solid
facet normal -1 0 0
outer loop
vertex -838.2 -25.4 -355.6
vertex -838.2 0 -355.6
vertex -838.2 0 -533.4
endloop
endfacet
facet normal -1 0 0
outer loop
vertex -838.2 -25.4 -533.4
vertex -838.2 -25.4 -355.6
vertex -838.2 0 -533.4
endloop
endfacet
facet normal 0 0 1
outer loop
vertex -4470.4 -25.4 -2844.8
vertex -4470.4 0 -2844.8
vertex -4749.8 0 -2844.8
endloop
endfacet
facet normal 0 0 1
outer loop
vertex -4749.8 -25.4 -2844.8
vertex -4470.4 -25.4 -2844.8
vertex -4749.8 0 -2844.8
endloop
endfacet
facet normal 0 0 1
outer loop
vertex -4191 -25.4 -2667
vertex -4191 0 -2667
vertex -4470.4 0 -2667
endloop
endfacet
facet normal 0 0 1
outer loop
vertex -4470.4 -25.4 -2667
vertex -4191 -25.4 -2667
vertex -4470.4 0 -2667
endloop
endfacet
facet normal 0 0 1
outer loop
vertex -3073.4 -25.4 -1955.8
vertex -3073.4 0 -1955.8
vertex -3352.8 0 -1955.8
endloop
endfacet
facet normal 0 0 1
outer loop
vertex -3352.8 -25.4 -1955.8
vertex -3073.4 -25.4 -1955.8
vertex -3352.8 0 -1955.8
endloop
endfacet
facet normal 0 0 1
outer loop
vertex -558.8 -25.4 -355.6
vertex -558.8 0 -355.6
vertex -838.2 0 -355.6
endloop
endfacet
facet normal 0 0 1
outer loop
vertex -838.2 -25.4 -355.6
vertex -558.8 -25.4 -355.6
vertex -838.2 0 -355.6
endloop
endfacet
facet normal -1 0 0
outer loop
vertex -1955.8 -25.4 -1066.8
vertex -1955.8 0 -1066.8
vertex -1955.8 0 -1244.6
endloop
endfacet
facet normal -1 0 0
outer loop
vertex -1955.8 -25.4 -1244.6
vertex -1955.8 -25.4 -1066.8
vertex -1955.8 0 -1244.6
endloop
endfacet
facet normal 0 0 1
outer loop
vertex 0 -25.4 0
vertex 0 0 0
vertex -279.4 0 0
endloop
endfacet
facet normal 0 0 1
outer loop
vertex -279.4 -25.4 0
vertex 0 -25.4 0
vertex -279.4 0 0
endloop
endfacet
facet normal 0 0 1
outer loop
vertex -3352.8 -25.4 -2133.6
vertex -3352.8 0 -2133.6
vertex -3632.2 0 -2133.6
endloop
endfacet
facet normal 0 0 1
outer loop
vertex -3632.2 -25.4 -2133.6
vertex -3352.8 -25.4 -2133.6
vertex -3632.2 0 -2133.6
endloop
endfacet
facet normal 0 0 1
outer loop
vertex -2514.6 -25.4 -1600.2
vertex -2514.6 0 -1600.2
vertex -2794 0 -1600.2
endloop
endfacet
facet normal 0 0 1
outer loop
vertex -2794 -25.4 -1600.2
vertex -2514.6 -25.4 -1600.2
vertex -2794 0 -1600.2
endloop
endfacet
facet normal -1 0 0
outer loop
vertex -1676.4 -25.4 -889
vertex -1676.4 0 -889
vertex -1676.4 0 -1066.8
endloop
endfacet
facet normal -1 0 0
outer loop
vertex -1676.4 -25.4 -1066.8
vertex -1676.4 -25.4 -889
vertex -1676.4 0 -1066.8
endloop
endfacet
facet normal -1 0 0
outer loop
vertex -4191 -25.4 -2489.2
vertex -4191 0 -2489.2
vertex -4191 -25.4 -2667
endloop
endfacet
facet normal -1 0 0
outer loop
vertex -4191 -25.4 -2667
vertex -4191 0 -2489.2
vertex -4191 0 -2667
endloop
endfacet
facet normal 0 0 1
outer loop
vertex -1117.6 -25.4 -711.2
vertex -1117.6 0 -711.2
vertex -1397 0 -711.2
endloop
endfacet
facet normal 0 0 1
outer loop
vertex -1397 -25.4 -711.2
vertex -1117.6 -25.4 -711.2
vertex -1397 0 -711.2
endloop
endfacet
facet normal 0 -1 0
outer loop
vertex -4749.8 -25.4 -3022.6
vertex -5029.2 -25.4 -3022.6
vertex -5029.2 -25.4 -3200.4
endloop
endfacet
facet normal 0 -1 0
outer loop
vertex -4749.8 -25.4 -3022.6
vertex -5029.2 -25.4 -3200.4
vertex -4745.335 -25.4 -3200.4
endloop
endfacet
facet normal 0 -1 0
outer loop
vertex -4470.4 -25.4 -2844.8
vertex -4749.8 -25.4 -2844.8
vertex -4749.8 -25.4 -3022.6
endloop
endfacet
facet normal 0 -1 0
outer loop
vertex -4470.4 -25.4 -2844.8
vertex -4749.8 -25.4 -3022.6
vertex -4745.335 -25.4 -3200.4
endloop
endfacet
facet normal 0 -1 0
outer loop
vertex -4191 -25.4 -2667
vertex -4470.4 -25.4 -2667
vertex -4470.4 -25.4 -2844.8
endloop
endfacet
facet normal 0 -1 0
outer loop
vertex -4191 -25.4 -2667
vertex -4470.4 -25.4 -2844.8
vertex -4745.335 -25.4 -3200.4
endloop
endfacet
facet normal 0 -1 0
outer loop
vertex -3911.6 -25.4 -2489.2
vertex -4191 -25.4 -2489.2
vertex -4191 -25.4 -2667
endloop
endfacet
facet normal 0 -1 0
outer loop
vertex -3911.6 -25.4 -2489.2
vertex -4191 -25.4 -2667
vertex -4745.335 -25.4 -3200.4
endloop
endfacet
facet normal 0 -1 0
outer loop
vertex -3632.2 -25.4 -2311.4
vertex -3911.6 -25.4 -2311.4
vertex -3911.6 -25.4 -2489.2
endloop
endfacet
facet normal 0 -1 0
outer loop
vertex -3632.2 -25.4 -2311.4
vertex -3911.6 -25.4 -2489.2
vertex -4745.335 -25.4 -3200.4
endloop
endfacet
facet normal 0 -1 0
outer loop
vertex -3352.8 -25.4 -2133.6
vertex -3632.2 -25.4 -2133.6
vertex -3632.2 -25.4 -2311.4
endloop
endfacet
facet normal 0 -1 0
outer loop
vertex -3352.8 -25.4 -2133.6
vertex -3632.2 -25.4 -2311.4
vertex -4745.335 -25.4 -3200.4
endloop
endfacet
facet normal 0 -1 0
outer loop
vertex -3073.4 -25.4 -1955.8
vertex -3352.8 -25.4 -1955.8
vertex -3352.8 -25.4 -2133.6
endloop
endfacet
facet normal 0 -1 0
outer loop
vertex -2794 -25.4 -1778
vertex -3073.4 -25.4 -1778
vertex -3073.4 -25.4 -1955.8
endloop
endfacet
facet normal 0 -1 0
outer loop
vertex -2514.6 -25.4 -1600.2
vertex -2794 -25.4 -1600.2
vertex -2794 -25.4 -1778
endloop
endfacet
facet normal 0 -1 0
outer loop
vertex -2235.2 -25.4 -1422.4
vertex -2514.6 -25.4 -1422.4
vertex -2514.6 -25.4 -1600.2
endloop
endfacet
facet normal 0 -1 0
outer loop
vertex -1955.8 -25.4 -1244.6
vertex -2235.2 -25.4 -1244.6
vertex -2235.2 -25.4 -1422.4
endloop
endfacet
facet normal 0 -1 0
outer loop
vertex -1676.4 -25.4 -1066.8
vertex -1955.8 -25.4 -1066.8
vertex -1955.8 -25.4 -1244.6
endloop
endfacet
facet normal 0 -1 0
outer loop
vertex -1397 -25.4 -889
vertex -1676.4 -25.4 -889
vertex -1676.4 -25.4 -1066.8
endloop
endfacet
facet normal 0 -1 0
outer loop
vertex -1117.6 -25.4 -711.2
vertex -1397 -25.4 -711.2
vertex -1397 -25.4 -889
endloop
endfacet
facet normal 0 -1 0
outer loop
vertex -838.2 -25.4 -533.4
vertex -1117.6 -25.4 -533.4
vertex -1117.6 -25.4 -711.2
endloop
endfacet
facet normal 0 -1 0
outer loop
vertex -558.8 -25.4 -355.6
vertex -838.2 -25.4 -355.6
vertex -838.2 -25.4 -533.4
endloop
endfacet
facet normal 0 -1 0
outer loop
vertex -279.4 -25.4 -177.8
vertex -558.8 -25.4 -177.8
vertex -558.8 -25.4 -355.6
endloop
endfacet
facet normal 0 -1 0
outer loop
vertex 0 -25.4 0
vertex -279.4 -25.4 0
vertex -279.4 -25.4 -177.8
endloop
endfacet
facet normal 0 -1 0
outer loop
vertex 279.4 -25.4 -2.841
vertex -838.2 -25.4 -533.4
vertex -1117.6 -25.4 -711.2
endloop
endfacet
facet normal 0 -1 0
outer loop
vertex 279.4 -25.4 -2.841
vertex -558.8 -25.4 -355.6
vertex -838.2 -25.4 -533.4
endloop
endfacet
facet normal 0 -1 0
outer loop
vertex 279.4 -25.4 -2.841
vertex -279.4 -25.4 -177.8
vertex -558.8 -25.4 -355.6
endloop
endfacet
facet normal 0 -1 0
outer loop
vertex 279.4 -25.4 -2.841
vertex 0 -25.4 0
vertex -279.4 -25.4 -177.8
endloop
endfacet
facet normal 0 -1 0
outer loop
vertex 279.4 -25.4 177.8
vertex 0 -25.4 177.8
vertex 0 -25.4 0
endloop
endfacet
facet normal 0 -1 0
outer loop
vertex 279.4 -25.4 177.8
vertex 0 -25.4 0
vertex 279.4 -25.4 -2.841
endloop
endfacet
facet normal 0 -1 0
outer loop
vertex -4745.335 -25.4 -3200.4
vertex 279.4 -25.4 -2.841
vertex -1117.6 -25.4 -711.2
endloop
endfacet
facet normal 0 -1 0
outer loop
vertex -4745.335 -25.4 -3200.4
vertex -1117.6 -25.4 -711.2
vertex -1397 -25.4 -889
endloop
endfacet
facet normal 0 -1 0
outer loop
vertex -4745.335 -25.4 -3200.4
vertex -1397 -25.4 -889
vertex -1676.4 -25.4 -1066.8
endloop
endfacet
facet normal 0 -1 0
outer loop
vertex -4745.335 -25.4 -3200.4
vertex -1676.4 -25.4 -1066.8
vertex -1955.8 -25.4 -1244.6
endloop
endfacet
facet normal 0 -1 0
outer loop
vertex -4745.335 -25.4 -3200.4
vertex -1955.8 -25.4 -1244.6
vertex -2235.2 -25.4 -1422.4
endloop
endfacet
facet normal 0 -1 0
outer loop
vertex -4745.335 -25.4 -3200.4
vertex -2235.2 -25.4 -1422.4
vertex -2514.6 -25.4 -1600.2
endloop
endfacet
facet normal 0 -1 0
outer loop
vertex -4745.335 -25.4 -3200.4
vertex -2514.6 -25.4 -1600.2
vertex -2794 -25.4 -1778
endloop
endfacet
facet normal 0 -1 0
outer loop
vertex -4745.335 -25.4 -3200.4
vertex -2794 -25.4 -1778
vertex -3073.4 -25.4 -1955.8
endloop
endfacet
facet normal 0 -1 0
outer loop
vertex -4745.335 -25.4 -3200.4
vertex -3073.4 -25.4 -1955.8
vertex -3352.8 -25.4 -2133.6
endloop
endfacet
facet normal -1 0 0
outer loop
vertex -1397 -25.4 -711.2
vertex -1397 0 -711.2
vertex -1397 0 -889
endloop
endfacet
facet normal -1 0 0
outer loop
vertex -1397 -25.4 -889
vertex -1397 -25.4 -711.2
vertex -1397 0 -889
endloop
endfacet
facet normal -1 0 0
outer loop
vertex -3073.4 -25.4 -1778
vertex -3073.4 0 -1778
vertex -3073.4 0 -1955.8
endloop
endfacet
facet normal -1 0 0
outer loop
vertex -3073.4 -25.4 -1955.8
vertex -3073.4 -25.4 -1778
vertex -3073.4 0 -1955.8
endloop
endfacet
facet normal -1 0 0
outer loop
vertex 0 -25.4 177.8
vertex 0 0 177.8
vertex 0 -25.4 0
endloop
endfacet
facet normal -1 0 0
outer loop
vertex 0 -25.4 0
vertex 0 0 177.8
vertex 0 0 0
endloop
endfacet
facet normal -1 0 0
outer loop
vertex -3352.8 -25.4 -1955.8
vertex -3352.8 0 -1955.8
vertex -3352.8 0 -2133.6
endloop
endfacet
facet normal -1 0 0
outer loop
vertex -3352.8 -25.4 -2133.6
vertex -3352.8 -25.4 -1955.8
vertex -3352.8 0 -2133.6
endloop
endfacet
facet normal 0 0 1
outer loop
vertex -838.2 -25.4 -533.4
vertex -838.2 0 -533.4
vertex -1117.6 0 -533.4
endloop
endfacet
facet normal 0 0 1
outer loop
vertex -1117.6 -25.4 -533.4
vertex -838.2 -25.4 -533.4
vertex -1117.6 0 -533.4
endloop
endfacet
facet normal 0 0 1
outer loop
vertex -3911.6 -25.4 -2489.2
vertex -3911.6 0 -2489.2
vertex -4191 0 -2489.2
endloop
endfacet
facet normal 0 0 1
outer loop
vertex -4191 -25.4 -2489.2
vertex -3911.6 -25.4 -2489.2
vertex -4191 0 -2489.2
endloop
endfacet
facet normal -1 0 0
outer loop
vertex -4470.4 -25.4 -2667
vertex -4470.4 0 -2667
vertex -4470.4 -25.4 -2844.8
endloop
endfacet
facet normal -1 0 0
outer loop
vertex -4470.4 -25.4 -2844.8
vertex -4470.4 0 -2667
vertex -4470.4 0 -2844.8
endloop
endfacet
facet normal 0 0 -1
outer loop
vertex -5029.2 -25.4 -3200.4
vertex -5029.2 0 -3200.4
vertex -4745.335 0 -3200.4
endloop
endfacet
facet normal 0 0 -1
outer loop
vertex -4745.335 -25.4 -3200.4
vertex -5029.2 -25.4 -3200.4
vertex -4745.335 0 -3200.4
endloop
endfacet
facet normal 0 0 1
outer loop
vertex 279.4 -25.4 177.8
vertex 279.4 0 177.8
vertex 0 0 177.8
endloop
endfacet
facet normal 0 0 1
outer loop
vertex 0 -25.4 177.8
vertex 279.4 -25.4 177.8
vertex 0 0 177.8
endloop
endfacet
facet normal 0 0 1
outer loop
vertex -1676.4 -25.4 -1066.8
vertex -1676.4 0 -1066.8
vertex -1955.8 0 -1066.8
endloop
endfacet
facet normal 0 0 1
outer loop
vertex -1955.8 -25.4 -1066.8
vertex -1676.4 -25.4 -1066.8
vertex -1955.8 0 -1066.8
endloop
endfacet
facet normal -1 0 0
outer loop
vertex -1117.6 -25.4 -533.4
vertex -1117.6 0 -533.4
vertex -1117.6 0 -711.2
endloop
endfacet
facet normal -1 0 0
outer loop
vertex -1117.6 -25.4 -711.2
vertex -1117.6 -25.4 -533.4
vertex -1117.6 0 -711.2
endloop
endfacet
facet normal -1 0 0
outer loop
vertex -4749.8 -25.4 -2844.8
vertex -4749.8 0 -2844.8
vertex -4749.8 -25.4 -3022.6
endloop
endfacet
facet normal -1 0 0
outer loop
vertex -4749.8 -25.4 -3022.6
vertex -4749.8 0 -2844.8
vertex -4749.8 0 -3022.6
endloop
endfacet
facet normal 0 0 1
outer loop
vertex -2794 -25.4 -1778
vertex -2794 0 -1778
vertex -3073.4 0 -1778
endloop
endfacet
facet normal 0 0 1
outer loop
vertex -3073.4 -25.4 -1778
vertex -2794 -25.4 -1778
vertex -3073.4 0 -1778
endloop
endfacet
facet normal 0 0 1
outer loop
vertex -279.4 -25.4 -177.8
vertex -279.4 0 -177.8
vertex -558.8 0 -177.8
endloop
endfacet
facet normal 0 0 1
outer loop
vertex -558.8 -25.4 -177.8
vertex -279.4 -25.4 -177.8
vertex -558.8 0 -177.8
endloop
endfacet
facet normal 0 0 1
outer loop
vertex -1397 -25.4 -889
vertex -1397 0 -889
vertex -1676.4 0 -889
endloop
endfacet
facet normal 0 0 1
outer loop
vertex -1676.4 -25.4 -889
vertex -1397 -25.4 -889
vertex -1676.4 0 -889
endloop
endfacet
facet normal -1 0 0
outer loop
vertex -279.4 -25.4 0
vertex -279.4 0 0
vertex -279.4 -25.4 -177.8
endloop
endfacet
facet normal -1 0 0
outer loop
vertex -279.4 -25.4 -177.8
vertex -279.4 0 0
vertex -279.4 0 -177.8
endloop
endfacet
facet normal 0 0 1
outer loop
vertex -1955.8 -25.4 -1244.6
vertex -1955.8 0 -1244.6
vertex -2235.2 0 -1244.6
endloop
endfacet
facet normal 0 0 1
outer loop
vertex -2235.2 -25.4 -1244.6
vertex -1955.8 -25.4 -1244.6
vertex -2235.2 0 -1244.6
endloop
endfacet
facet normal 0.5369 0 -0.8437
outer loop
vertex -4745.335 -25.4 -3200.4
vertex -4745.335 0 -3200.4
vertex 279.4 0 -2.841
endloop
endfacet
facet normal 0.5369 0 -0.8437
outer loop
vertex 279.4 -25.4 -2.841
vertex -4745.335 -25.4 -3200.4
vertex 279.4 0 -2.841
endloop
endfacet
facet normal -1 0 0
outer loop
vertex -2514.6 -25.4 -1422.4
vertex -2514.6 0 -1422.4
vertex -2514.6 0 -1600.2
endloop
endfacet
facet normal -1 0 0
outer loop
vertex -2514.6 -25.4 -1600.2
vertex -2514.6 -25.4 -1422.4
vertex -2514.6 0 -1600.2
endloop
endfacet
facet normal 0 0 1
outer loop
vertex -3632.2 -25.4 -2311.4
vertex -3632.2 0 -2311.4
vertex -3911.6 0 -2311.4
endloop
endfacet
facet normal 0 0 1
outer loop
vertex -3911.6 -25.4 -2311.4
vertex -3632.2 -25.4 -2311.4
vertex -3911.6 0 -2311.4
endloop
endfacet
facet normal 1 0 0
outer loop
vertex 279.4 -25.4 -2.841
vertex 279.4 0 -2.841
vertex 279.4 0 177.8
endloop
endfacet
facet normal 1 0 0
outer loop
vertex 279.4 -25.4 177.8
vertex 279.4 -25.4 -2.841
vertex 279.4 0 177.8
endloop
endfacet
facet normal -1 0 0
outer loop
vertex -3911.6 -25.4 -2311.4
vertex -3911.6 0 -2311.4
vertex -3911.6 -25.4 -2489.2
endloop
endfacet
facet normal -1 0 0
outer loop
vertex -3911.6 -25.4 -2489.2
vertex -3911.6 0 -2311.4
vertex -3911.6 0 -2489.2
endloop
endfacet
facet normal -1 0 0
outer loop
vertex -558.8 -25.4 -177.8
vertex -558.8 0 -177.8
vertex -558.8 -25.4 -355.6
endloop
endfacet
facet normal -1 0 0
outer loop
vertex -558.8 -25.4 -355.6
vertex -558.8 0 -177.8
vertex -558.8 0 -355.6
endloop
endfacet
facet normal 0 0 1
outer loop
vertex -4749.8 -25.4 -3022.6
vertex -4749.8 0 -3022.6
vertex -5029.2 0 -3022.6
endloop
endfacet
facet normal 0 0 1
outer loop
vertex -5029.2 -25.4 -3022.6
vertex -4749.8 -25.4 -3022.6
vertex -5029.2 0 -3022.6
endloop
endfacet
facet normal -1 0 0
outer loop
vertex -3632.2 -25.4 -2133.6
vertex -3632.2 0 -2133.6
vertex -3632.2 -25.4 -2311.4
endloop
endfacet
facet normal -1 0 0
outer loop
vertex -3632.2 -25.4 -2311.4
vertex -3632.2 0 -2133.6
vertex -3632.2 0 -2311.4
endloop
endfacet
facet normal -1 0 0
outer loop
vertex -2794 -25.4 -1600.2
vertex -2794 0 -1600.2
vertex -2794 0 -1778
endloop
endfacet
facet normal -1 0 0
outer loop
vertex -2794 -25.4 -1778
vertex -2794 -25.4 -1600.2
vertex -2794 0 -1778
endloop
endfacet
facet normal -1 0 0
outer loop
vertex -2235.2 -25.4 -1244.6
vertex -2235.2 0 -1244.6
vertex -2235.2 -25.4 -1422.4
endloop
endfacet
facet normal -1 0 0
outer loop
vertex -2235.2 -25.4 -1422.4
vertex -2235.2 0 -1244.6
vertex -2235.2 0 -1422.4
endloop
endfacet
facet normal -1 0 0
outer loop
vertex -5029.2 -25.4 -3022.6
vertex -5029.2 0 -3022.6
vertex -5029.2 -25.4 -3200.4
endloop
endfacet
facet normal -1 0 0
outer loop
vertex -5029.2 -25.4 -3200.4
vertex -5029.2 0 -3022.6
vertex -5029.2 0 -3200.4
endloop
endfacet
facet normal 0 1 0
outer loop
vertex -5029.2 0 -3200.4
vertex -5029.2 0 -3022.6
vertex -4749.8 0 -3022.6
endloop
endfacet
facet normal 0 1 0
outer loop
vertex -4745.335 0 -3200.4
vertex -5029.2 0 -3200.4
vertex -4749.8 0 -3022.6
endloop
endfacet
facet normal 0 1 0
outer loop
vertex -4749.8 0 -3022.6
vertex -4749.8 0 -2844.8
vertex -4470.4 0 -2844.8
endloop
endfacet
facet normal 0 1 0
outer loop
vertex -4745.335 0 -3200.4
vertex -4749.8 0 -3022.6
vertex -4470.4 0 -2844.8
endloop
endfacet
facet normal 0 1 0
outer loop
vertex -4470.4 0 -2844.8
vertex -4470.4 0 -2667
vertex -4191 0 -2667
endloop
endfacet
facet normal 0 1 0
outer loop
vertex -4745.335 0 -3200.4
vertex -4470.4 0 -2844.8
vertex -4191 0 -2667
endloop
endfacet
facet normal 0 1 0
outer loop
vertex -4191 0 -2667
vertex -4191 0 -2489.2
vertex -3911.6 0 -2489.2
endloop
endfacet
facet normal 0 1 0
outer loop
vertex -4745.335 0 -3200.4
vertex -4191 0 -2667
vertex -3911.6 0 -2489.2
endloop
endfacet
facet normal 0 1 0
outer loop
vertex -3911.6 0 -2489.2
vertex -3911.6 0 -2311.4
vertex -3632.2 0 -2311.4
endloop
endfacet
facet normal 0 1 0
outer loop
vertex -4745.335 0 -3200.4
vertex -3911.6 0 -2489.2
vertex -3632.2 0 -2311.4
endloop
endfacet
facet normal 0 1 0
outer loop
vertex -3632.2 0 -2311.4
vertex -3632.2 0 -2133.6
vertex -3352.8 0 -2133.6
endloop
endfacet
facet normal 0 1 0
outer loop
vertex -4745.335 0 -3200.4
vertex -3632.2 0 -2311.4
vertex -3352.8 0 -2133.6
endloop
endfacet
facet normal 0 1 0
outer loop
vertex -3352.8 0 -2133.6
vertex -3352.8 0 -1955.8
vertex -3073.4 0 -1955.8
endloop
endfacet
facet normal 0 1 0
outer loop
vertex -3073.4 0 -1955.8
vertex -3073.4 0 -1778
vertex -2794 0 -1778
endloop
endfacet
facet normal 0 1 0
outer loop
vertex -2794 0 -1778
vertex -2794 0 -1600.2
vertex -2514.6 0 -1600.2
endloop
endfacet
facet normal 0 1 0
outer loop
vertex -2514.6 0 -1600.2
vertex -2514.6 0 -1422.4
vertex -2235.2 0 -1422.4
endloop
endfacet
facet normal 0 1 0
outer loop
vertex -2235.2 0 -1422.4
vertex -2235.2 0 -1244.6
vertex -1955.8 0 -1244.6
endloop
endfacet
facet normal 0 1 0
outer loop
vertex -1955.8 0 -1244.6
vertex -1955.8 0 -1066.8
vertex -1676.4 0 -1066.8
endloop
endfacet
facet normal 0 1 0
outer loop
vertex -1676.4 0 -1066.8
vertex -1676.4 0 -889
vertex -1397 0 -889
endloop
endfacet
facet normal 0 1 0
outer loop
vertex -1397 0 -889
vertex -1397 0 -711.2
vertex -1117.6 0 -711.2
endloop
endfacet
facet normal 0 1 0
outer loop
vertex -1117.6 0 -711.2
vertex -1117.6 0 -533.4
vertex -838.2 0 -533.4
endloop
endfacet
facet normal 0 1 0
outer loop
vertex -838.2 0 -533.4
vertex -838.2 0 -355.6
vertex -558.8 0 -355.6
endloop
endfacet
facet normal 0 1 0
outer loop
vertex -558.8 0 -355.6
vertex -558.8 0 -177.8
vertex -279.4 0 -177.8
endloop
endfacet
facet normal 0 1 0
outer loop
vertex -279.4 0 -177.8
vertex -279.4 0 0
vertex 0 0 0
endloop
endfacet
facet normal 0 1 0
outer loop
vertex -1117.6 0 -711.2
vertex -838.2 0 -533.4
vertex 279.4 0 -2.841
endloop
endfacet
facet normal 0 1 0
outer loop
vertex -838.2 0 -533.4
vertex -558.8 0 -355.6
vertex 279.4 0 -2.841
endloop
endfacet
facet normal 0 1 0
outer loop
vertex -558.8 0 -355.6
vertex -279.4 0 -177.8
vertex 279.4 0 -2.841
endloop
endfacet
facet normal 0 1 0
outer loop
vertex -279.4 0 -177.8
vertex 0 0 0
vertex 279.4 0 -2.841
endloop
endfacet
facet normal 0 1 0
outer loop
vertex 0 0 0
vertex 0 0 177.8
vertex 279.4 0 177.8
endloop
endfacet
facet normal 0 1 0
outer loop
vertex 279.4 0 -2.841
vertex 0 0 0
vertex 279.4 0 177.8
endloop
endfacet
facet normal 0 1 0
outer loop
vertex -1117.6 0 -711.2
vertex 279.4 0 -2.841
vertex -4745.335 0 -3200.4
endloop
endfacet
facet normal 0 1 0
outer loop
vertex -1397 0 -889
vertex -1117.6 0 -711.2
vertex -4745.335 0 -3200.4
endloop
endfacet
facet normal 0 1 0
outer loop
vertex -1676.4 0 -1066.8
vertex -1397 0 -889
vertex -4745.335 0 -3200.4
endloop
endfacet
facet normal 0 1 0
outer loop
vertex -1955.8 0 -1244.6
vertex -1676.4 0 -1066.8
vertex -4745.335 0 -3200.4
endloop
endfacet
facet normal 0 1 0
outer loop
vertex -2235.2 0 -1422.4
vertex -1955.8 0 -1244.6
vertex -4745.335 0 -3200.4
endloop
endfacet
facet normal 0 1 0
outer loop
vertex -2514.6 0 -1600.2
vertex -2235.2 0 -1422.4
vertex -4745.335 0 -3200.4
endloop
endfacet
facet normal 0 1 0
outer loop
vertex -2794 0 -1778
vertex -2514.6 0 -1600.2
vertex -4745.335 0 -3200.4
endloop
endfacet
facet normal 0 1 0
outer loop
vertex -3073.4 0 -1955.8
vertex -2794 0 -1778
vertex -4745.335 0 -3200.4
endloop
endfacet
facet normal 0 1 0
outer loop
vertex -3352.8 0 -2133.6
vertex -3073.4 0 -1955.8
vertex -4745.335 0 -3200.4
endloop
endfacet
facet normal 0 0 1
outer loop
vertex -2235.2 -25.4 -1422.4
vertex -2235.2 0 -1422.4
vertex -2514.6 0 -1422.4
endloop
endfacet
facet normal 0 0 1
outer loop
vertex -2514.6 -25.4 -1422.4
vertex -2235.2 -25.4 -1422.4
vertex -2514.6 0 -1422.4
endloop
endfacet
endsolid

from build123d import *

# Parameters (mm, degrees)
F1_DEPTH = 25.4


with BuildPart() as f1:
    # F0 (on Front) → F1 (new body)
    with BuildSketch(Plane.XZ):
        Polygon((0, 177.8), (0, 0), (-279.4, 0), (-279.4, -177.8), (-558.8, -177.8), (-558.8, -355.6), (-838.2, -355.6), (-838.2, -533.4), (-1117.6, -533.4), (-1117.6, -711.2), (-1397, -711.2), (-1397, -889), (-1676.4, -889), (-1676.4, -1066.8), (-1955.8, -1066.8), (-1955.8, -1244.6), (-2235.2, -1244.6), (-2235.2, -1422.4), (-2514.6, -1422.4), (-2514.6, -1600.2), (-2794, -1600.2), (-2794, -1778), (-3073.4, -1778), (-3073.4, -1955.8), (-3352.8, -1955.8), (-3352.8, -2133.6), (-3632.2, -2133.6), (-3632.2, -2311.4), (-3911.6, -2311.4), (-3911.6, -2489.2), (-4191, -2489.2), (-4191, -2667), (-4470.4, -2667), (-4470.4, -2844.8), (-4749.8, -2844.8), (-4749.8, -3022.6), (-5029.2, -3022.6), (-5029.2, -3200.4), (-4745.335301, -3200.4), (279.4, -2.841172), (279.4, 177.8), align=None)
    extrude(amount=F1_DEPTH)


solid = f1.part
